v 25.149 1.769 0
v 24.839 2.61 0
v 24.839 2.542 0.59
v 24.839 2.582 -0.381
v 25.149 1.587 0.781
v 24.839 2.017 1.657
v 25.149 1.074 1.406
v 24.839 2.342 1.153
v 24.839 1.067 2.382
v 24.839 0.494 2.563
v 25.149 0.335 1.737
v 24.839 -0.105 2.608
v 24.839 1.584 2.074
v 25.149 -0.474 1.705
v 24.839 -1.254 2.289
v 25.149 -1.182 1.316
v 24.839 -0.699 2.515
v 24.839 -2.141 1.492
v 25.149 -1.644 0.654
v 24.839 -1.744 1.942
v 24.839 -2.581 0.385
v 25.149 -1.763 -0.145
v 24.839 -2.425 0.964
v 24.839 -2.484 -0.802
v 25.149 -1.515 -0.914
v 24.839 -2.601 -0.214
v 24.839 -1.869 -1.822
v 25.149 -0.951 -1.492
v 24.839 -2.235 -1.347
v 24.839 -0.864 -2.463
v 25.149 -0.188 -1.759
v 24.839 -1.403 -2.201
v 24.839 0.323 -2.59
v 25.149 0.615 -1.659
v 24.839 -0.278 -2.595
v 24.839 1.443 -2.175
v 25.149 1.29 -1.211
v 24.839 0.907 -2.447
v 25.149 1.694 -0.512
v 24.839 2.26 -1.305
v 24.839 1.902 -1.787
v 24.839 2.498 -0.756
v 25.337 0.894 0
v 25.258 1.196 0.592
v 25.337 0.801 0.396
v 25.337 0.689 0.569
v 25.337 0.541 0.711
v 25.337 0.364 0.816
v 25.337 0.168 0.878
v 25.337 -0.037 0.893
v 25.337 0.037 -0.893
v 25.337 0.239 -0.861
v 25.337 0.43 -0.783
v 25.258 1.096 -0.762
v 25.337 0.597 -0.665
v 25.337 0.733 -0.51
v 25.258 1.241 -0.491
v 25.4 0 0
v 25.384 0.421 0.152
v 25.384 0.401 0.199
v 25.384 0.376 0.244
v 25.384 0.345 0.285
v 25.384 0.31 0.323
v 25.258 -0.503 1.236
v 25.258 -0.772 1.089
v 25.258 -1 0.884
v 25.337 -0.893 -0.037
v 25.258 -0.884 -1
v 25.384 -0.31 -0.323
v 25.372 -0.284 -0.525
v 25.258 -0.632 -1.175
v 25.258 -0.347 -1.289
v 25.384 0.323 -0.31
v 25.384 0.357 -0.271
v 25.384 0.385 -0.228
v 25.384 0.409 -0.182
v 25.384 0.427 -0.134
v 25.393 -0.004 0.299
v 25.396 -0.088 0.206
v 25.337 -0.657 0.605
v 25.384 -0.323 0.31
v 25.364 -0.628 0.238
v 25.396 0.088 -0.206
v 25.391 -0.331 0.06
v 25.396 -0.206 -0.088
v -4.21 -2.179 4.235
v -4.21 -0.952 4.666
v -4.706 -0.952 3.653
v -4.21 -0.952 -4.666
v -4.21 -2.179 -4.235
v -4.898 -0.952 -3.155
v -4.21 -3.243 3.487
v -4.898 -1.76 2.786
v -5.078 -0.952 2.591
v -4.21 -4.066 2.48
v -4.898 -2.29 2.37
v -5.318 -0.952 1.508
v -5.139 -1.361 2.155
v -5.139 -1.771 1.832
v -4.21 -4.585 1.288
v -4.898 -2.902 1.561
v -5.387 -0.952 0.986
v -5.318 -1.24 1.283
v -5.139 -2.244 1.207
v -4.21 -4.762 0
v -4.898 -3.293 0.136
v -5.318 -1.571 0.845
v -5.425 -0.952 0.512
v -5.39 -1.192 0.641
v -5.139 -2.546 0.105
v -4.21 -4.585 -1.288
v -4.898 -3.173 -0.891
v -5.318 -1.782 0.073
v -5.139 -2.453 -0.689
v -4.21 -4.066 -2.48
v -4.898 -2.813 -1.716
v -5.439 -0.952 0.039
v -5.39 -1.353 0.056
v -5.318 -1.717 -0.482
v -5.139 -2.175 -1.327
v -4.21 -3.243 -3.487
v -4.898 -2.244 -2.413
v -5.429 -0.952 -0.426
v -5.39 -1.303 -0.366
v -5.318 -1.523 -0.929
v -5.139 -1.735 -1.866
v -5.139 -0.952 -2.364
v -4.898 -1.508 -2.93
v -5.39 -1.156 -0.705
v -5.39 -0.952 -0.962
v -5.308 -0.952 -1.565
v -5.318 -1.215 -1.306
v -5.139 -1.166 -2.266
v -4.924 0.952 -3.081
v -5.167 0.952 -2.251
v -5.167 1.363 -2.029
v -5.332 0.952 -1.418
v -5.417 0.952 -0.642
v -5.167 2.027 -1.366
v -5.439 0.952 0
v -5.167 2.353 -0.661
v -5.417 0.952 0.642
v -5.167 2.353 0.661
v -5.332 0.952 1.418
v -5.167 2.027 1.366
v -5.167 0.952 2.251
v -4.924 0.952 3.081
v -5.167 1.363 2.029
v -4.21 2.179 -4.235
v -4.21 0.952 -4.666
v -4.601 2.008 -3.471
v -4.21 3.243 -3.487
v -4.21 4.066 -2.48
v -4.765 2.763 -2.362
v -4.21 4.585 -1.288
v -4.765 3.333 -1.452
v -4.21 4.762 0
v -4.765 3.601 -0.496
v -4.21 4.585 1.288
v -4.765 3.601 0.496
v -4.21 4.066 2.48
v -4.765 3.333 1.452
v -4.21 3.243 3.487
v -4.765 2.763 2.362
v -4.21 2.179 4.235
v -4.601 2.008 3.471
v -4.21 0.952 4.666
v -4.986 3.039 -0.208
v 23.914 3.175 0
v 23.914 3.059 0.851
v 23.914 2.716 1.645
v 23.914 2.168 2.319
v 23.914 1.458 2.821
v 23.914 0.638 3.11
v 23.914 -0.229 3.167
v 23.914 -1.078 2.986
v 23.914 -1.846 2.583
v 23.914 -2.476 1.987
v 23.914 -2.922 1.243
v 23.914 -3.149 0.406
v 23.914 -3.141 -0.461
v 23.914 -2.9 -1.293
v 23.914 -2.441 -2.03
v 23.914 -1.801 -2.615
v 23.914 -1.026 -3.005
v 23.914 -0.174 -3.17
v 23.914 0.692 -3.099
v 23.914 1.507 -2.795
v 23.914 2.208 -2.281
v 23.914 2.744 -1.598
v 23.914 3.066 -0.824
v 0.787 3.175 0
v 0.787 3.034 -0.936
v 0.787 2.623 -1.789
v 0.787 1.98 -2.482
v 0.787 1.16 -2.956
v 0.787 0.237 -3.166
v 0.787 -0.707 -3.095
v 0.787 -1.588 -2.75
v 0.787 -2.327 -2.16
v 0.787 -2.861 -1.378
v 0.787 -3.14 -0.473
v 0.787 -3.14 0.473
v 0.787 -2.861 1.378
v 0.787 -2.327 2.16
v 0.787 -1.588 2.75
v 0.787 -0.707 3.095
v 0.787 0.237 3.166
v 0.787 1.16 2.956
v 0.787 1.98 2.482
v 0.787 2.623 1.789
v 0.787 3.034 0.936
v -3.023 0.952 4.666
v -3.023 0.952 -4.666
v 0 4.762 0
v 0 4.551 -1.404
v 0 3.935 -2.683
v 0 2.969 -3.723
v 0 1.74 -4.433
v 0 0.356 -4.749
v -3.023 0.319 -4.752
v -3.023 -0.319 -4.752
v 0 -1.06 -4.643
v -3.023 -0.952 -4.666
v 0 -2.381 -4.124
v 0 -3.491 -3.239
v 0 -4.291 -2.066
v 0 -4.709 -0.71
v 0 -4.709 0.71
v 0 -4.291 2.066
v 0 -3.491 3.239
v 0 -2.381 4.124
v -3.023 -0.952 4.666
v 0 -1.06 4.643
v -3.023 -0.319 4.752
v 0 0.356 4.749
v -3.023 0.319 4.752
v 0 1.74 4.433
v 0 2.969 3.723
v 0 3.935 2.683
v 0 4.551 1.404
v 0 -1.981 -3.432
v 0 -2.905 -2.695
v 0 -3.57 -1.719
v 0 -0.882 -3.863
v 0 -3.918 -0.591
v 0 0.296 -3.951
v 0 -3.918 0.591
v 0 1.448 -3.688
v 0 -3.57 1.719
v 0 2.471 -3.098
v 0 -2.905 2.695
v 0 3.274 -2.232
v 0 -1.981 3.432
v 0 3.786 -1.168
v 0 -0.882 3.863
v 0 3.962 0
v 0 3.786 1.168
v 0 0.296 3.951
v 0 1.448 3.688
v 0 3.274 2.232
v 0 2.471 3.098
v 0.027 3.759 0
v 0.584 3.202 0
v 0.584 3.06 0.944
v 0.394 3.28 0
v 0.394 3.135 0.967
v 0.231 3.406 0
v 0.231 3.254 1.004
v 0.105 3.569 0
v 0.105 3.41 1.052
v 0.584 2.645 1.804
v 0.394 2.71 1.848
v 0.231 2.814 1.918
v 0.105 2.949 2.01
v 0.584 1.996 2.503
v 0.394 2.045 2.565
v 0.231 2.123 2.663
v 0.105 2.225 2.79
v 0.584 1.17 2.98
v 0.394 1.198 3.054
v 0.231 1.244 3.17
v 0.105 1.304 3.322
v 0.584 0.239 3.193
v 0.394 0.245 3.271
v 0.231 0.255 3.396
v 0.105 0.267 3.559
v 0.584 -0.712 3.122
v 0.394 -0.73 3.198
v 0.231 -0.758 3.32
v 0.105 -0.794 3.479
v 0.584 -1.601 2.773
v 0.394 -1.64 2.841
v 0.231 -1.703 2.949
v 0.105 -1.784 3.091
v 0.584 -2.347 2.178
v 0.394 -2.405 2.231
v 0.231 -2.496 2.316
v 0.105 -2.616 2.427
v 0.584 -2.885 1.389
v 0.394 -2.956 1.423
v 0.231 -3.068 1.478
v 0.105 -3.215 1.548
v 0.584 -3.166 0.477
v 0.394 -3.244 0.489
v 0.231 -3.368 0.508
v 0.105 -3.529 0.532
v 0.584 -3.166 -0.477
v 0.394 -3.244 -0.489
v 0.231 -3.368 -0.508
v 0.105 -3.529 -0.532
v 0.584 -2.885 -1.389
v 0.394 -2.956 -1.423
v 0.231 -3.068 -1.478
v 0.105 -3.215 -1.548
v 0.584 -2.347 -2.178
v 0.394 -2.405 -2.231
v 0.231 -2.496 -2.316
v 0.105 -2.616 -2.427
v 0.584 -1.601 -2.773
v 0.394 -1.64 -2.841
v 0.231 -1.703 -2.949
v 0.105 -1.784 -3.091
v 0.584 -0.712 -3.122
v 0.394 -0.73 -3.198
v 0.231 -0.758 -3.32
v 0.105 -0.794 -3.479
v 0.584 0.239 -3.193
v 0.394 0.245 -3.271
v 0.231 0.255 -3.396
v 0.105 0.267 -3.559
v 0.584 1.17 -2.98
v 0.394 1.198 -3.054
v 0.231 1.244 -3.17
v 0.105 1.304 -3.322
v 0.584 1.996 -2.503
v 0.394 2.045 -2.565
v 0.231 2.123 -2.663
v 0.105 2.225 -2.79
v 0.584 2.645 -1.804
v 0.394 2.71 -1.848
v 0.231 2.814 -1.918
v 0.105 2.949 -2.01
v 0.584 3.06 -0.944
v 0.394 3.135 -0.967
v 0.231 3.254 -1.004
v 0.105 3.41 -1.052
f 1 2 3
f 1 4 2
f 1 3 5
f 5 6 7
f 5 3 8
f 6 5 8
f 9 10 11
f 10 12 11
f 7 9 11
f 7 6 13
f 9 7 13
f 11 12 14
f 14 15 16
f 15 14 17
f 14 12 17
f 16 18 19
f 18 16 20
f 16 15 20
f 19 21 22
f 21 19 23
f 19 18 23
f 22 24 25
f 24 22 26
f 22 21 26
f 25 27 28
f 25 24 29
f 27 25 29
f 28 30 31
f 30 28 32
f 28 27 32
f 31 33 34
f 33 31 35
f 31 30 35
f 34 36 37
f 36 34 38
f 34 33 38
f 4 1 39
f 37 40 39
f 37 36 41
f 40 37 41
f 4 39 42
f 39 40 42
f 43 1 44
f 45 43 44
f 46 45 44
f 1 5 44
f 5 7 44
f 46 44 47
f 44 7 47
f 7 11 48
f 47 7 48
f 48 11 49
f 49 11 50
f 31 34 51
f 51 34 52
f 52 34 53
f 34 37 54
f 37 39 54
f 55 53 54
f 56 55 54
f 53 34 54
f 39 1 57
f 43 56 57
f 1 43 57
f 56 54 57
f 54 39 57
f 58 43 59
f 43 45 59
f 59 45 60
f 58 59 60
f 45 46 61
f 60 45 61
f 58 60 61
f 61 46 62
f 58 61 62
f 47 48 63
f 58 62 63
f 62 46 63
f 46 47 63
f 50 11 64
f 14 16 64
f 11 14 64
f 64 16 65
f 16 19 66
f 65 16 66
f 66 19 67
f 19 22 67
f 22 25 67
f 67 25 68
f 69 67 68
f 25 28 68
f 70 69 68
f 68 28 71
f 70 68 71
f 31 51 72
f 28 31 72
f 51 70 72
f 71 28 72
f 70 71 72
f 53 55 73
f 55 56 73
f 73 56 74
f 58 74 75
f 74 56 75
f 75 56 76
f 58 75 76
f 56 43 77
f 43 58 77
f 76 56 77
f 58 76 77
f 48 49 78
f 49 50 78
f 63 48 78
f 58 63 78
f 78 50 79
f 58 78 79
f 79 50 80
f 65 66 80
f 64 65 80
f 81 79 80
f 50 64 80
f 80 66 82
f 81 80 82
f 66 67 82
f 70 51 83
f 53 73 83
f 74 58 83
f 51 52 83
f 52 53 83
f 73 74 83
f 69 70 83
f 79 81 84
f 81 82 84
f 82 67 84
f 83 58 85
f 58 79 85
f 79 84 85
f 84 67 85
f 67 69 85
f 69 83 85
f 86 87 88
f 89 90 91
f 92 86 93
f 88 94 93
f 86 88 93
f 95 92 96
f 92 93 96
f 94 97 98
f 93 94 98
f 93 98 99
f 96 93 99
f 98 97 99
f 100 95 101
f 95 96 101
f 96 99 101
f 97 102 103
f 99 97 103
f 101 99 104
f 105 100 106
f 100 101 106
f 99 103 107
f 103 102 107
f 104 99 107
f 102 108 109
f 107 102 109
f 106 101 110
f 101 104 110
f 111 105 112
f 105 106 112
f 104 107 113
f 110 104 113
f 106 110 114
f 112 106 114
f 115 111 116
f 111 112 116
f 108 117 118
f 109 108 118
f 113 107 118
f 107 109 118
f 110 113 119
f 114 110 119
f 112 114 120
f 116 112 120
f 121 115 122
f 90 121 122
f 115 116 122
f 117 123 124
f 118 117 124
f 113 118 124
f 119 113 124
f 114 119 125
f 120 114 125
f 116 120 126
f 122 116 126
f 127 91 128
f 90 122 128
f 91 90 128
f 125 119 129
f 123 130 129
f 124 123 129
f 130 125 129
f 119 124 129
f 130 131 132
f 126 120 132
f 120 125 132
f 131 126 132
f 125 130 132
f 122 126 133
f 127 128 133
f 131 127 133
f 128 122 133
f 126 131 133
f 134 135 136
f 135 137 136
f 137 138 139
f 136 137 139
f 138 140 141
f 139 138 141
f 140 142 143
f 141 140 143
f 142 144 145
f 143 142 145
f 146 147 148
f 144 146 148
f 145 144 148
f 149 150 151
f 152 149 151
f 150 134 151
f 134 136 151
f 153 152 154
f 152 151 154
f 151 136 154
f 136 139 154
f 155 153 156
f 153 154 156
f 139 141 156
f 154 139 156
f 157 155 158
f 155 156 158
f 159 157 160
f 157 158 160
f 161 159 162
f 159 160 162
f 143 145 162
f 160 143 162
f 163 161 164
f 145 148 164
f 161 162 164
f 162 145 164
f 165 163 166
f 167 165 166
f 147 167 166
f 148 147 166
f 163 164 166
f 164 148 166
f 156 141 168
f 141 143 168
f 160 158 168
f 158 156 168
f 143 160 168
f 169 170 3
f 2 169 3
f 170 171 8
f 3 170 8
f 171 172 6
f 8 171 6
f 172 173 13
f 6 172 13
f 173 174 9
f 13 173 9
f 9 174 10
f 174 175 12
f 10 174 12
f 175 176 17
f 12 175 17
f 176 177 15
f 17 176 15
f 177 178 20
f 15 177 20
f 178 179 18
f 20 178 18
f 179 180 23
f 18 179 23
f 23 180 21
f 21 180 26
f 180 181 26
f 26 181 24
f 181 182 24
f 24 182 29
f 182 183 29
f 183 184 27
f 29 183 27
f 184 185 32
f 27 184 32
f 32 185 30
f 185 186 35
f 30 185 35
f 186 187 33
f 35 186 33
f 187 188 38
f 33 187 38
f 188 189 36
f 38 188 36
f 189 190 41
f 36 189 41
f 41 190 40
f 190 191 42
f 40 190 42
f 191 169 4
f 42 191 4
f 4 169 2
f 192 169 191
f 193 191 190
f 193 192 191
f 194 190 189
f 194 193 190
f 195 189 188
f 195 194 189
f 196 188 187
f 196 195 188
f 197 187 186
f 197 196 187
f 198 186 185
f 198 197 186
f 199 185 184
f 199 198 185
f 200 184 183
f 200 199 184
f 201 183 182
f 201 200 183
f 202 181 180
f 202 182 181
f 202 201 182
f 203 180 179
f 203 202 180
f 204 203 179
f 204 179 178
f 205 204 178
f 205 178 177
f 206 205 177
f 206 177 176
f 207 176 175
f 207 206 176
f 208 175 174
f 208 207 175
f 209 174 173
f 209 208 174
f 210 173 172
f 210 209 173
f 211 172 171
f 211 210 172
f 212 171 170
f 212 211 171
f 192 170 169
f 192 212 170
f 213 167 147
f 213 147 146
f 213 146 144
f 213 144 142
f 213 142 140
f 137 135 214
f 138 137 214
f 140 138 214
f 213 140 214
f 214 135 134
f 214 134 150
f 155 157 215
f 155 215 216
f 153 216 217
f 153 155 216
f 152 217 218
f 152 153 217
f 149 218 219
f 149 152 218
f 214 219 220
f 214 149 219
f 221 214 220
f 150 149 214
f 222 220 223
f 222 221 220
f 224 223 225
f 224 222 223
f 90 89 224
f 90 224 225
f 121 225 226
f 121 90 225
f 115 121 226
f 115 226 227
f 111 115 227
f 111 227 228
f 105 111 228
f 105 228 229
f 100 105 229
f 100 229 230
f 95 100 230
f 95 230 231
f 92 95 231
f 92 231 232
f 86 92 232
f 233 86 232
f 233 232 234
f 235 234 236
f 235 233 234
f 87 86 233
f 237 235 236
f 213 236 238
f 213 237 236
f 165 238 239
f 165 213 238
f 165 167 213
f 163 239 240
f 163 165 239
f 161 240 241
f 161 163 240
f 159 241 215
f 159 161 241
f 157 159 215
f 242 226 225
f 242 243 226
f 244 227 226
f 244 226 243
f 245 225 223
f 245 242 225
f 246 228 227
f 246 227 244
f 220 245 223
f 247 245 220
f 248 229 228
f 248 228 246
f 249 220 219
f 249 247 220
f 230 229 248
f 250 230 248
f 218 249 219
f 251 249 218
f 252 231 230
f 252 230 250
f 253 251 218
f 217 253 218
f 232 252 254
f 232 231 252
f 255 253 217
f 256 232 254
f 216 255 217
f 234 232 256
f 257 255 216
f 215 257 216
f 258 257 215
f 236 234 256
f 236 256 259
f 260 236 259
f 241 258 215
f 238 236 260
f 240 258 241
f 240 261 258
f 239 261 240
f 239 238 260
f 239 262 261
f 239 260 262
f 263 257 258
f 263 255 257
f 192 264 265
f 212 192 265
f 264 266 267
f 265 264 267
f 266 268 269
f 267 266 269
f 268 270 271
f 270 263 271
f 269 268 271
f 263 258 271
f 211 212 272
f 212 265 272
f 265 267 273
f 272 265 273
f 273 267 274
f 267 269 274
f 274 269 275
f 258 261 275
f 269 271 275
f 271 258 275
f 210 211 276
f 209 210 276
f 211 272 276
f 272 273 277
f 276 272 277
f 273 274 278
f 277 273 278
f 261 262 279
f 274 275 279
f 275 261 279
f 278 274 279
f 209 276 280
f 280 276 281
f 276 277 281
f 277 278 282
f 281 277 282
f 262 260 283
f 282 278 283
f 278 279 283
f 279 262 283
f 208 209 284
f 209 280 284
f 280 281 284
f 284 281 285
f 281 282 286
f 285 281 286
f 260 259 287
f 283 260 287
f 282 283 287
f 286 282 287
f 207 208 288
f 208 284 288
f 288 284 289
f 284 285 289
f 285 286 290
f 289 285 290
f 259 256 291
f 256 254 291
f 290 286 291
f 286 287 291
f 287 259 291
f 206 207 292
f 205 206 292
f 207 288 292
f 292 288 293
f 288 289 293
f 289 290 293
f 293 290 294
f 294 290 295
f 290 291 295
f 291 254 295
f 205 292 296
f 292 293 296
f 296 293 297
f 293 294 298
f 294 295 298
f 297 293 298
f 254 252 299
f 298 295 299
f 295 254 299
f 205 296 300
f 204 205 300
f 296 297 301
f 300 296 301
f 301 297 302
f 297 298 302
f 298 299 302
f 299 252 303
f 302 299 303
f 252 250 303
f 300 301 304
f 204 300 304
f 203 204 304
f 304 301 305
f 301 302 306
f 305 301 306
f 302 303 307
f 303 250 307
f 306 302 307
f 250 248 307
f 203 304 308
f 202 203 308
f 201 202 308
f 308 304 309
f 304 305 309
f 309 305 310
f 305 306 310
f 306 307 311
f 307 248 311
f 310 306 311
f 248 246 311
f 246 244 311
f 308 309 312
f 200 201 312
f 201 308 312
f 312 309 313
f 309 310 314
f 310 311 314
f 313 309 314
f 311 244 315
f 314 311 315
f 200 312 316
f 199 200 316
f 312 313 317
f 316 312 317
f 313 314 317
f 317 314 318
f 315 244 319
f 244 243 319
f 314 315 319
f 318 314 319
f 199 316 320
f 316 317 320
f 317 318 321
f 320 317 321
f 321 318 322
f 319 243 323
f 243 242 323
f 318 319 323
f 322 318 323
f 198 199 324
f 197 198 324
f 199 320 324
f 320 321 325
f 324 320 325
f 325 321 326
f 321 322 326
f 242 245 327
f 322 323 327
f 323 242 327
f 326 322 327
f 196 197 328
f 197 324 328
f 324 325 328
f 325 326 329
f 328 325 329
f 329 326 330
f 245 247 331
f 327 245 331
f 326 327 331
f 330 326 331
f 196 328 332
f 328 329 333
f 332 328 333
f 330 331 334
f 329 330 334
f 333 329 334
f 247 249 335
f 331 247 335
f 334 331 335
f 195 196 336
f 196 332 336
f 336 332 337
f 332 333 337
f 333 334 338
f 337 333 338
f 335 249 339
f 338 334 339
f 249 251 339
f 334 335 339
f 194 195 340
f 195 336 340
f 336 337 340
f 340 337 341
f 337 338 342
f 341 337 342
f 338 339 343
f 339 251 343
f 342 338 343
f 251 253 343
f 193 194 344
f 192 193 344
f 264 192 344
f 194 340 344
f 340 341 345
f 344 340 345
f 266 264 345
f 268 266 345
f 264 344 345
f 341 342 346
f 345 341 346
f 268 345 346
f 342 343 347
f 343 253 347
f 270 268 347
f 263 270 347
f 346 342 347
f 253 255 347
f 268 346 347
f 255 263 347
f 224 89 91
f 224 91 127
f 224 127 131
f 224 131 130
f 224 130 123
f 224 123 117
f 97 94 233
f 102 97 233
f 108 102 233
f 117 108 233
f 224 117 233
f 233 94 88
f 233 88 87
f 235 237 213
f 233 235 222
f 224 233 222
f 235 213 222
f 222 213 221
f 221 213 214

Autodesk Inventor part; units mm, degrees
ref_plane "YZ Plane" through (0, 0, 0) normal (1, 0, 0) x (0, 1, 0)
sketch "Szkic1" plane through (0, 0, 0) normal (0, 0, 1) x (1, 0, 0)
  line L0 (-5.4864, 0) -> (25.4, 0)
  line L1 (25.4, 0) -> (25.4, 3.175)
  line L2 (25.4, 3.175) -> (6.35, 3.175)
  line L3 (6.35, 3.175) -> (5.588, 3.175)
  line L4 (5.588, 3.175) -> (0, 3.175)
  line L5 (0, 3.175) -> (0, 4.7625)
  line L6 (-12.0399, 0) -> (31.64, 0) projected
  line L7 (0, -0.9693) -> (0, 5.8158) projected
  line L8 (0, 4.7625) -> (-4.2103, 4.7625)
  arc A0 (-4.2103, 4.7625) -> (-5.4864, 0) centre (4.0386, 0) ccw
  line L9 (6.35, 3.175) -> (0, 3.175) construction
  dimension "d0" = 25.4
  dimension "d1" = 19.05
  dimension "d2" = 0.762
  dimension "d3" = 5.4864
  dimension "d4" = 6.35
  dimension "d5" = 6.35
  dimension "d9" = 9.525
  dimension "d10" = 0
  dimension "d13" = 9.525
revolve "Bryła" add sketch "Szkic1" angle 360 about axis through (-5.4864, 0, 0) along (1, 0, 0)
ref_plane "IDS_WORKPLANE{1}" through (-5.4864, 0, 0) normal (1, 0, 0) x (0, 0, -1)
sketch "Szkic2" plane through (-5.4864, 0, 0) normal (1, 0, 0) x (0, 0, -1)
  circle A0 centre (0, 0) radius 4.7625 projected
  line L0 (0, -6.6675) -> (0, 6.6675) projected
  line L1 (6.6675, 0) -> (-6.6675, 0) projected
  line L2 (-4.7625, 0.9525) -> (4.7625, 0.9525)
  line L3 (4.7625, 0.9525) -> (4.7625, -0.9525)
  line L4 (4.7625, -0.9525) -> (-4.7625, -0.9525)
  line L5 (-4.7625, -0.9525) -> (-4.7625, 0.9525)
  line L6 (-4.7625, 0) -> (4.7625, 0) construction
  line L7 (0, 0.9525) -> (0, -0.9525) construction
  dimension "d15" = 1.905
extrude "Szczelina" cut sketch "Szkic2" along normal blind 2.4638 contours L1 L0 L2 A0 | L3 L4 A0 | A0 L4 L0 L1 | A0 L2 L3 | L1 A0 L2 L0 | L0 L4 A0 L1 | L5 L2 A0 | A0 L4 L5
thread "Gwint" size "1/4-20 UNC" class "2A" standard "ANSI Unified Screw Threads" length 19.05
sketch "Szkic3" plane through (0, 0, 0) normal (0, 0, 1) x (1, 0, 0)
  line L0 (25.4, 0) -> (25.4, 3.175) projected
  line L1 (25.4, 3.175) -> (6.35, 3.175) projected
  line L2 (-5.4864, 0) -> (25.4, 0) projected
  arc A0 (25.4, 0) -> (24.5493, 3.175) centre (19.05, 0) ccw
  line L3 (25.4, -3.175) -> (25.4, 3.175) projected
  line L4 (24.5493, 3.175) -> (24.5493, 0)
  line L5 (24.5493, 0) -> (25.4, 0)
  dimension "d40" = 6.35
revolve "Zaokrąglenie1" cut sketch "Szkic3" angle 360 about axis through (-5.4864, 0, 0) along (1, 0, 0) contours A0 L1 L0
chamfer "Faza" distance 0.635 angle 45 1 edges at (24.5493, -3.175, 0)
ref_plane "Work Plane2" through (41.275, 0, 0) normal (0, 0, -1) x (1, 0, 0)
fillet "Zaokrąglenie4" radius 0.7874 1 edges at (0, -3.175, 0)
equation "\"d0\" = NLG"
equation "\"d1\" = GEL"
equation "\"d2\" = GAL"
equation "\"d3\" = KOH"
equation "\"d4\" = GD"
equation "\"d5\" = BDM"
equation "\"d9\" = KOD"
equation "\"d13\" = KR"
equation "\"d15\" = SBR"
equation "\"d16\" = STI"
equation "\"d40\" = GD"
equation "\"d11\" = GEL"
equation "\"d43\" = 0.5 * RR"
equation "\"d46\" = R"
equation "\"GD\" = NND"
equation "\"NLG\" = 25.4"
equation "\"GEL\" = 19.05"
equation "\"KOD\" = 9.525"
equation "\"KOH\" = 5.4864"
equation "\"GAL\" = 0.762"
equation "\"BDM\" = NND"
equation "\"SBR\" = 1.905"
equation "\"STI\" = 2.4638"
equation "\"KEWI\" = 0"
equation "\"KR\" = KOD"
equation "\"d14\" = -KOH"
equation "\"R\" = 0.7874"
equation "\"THREADDIA\" = 6.35"
equation "\"TOA\" = 30deg"
equation "\"KOH1\" = 4.3688"
equation "\"NND\" = 6.35"
equation "\"GD1\" = 4.8387"
equation "\"THREADDESC\" = 1.2345"
equation "\"RR\" = 1.27"
properties part number "ANSI B18.6.2 - 1/4-20 UNC - 1" material "Stal, miękka"
